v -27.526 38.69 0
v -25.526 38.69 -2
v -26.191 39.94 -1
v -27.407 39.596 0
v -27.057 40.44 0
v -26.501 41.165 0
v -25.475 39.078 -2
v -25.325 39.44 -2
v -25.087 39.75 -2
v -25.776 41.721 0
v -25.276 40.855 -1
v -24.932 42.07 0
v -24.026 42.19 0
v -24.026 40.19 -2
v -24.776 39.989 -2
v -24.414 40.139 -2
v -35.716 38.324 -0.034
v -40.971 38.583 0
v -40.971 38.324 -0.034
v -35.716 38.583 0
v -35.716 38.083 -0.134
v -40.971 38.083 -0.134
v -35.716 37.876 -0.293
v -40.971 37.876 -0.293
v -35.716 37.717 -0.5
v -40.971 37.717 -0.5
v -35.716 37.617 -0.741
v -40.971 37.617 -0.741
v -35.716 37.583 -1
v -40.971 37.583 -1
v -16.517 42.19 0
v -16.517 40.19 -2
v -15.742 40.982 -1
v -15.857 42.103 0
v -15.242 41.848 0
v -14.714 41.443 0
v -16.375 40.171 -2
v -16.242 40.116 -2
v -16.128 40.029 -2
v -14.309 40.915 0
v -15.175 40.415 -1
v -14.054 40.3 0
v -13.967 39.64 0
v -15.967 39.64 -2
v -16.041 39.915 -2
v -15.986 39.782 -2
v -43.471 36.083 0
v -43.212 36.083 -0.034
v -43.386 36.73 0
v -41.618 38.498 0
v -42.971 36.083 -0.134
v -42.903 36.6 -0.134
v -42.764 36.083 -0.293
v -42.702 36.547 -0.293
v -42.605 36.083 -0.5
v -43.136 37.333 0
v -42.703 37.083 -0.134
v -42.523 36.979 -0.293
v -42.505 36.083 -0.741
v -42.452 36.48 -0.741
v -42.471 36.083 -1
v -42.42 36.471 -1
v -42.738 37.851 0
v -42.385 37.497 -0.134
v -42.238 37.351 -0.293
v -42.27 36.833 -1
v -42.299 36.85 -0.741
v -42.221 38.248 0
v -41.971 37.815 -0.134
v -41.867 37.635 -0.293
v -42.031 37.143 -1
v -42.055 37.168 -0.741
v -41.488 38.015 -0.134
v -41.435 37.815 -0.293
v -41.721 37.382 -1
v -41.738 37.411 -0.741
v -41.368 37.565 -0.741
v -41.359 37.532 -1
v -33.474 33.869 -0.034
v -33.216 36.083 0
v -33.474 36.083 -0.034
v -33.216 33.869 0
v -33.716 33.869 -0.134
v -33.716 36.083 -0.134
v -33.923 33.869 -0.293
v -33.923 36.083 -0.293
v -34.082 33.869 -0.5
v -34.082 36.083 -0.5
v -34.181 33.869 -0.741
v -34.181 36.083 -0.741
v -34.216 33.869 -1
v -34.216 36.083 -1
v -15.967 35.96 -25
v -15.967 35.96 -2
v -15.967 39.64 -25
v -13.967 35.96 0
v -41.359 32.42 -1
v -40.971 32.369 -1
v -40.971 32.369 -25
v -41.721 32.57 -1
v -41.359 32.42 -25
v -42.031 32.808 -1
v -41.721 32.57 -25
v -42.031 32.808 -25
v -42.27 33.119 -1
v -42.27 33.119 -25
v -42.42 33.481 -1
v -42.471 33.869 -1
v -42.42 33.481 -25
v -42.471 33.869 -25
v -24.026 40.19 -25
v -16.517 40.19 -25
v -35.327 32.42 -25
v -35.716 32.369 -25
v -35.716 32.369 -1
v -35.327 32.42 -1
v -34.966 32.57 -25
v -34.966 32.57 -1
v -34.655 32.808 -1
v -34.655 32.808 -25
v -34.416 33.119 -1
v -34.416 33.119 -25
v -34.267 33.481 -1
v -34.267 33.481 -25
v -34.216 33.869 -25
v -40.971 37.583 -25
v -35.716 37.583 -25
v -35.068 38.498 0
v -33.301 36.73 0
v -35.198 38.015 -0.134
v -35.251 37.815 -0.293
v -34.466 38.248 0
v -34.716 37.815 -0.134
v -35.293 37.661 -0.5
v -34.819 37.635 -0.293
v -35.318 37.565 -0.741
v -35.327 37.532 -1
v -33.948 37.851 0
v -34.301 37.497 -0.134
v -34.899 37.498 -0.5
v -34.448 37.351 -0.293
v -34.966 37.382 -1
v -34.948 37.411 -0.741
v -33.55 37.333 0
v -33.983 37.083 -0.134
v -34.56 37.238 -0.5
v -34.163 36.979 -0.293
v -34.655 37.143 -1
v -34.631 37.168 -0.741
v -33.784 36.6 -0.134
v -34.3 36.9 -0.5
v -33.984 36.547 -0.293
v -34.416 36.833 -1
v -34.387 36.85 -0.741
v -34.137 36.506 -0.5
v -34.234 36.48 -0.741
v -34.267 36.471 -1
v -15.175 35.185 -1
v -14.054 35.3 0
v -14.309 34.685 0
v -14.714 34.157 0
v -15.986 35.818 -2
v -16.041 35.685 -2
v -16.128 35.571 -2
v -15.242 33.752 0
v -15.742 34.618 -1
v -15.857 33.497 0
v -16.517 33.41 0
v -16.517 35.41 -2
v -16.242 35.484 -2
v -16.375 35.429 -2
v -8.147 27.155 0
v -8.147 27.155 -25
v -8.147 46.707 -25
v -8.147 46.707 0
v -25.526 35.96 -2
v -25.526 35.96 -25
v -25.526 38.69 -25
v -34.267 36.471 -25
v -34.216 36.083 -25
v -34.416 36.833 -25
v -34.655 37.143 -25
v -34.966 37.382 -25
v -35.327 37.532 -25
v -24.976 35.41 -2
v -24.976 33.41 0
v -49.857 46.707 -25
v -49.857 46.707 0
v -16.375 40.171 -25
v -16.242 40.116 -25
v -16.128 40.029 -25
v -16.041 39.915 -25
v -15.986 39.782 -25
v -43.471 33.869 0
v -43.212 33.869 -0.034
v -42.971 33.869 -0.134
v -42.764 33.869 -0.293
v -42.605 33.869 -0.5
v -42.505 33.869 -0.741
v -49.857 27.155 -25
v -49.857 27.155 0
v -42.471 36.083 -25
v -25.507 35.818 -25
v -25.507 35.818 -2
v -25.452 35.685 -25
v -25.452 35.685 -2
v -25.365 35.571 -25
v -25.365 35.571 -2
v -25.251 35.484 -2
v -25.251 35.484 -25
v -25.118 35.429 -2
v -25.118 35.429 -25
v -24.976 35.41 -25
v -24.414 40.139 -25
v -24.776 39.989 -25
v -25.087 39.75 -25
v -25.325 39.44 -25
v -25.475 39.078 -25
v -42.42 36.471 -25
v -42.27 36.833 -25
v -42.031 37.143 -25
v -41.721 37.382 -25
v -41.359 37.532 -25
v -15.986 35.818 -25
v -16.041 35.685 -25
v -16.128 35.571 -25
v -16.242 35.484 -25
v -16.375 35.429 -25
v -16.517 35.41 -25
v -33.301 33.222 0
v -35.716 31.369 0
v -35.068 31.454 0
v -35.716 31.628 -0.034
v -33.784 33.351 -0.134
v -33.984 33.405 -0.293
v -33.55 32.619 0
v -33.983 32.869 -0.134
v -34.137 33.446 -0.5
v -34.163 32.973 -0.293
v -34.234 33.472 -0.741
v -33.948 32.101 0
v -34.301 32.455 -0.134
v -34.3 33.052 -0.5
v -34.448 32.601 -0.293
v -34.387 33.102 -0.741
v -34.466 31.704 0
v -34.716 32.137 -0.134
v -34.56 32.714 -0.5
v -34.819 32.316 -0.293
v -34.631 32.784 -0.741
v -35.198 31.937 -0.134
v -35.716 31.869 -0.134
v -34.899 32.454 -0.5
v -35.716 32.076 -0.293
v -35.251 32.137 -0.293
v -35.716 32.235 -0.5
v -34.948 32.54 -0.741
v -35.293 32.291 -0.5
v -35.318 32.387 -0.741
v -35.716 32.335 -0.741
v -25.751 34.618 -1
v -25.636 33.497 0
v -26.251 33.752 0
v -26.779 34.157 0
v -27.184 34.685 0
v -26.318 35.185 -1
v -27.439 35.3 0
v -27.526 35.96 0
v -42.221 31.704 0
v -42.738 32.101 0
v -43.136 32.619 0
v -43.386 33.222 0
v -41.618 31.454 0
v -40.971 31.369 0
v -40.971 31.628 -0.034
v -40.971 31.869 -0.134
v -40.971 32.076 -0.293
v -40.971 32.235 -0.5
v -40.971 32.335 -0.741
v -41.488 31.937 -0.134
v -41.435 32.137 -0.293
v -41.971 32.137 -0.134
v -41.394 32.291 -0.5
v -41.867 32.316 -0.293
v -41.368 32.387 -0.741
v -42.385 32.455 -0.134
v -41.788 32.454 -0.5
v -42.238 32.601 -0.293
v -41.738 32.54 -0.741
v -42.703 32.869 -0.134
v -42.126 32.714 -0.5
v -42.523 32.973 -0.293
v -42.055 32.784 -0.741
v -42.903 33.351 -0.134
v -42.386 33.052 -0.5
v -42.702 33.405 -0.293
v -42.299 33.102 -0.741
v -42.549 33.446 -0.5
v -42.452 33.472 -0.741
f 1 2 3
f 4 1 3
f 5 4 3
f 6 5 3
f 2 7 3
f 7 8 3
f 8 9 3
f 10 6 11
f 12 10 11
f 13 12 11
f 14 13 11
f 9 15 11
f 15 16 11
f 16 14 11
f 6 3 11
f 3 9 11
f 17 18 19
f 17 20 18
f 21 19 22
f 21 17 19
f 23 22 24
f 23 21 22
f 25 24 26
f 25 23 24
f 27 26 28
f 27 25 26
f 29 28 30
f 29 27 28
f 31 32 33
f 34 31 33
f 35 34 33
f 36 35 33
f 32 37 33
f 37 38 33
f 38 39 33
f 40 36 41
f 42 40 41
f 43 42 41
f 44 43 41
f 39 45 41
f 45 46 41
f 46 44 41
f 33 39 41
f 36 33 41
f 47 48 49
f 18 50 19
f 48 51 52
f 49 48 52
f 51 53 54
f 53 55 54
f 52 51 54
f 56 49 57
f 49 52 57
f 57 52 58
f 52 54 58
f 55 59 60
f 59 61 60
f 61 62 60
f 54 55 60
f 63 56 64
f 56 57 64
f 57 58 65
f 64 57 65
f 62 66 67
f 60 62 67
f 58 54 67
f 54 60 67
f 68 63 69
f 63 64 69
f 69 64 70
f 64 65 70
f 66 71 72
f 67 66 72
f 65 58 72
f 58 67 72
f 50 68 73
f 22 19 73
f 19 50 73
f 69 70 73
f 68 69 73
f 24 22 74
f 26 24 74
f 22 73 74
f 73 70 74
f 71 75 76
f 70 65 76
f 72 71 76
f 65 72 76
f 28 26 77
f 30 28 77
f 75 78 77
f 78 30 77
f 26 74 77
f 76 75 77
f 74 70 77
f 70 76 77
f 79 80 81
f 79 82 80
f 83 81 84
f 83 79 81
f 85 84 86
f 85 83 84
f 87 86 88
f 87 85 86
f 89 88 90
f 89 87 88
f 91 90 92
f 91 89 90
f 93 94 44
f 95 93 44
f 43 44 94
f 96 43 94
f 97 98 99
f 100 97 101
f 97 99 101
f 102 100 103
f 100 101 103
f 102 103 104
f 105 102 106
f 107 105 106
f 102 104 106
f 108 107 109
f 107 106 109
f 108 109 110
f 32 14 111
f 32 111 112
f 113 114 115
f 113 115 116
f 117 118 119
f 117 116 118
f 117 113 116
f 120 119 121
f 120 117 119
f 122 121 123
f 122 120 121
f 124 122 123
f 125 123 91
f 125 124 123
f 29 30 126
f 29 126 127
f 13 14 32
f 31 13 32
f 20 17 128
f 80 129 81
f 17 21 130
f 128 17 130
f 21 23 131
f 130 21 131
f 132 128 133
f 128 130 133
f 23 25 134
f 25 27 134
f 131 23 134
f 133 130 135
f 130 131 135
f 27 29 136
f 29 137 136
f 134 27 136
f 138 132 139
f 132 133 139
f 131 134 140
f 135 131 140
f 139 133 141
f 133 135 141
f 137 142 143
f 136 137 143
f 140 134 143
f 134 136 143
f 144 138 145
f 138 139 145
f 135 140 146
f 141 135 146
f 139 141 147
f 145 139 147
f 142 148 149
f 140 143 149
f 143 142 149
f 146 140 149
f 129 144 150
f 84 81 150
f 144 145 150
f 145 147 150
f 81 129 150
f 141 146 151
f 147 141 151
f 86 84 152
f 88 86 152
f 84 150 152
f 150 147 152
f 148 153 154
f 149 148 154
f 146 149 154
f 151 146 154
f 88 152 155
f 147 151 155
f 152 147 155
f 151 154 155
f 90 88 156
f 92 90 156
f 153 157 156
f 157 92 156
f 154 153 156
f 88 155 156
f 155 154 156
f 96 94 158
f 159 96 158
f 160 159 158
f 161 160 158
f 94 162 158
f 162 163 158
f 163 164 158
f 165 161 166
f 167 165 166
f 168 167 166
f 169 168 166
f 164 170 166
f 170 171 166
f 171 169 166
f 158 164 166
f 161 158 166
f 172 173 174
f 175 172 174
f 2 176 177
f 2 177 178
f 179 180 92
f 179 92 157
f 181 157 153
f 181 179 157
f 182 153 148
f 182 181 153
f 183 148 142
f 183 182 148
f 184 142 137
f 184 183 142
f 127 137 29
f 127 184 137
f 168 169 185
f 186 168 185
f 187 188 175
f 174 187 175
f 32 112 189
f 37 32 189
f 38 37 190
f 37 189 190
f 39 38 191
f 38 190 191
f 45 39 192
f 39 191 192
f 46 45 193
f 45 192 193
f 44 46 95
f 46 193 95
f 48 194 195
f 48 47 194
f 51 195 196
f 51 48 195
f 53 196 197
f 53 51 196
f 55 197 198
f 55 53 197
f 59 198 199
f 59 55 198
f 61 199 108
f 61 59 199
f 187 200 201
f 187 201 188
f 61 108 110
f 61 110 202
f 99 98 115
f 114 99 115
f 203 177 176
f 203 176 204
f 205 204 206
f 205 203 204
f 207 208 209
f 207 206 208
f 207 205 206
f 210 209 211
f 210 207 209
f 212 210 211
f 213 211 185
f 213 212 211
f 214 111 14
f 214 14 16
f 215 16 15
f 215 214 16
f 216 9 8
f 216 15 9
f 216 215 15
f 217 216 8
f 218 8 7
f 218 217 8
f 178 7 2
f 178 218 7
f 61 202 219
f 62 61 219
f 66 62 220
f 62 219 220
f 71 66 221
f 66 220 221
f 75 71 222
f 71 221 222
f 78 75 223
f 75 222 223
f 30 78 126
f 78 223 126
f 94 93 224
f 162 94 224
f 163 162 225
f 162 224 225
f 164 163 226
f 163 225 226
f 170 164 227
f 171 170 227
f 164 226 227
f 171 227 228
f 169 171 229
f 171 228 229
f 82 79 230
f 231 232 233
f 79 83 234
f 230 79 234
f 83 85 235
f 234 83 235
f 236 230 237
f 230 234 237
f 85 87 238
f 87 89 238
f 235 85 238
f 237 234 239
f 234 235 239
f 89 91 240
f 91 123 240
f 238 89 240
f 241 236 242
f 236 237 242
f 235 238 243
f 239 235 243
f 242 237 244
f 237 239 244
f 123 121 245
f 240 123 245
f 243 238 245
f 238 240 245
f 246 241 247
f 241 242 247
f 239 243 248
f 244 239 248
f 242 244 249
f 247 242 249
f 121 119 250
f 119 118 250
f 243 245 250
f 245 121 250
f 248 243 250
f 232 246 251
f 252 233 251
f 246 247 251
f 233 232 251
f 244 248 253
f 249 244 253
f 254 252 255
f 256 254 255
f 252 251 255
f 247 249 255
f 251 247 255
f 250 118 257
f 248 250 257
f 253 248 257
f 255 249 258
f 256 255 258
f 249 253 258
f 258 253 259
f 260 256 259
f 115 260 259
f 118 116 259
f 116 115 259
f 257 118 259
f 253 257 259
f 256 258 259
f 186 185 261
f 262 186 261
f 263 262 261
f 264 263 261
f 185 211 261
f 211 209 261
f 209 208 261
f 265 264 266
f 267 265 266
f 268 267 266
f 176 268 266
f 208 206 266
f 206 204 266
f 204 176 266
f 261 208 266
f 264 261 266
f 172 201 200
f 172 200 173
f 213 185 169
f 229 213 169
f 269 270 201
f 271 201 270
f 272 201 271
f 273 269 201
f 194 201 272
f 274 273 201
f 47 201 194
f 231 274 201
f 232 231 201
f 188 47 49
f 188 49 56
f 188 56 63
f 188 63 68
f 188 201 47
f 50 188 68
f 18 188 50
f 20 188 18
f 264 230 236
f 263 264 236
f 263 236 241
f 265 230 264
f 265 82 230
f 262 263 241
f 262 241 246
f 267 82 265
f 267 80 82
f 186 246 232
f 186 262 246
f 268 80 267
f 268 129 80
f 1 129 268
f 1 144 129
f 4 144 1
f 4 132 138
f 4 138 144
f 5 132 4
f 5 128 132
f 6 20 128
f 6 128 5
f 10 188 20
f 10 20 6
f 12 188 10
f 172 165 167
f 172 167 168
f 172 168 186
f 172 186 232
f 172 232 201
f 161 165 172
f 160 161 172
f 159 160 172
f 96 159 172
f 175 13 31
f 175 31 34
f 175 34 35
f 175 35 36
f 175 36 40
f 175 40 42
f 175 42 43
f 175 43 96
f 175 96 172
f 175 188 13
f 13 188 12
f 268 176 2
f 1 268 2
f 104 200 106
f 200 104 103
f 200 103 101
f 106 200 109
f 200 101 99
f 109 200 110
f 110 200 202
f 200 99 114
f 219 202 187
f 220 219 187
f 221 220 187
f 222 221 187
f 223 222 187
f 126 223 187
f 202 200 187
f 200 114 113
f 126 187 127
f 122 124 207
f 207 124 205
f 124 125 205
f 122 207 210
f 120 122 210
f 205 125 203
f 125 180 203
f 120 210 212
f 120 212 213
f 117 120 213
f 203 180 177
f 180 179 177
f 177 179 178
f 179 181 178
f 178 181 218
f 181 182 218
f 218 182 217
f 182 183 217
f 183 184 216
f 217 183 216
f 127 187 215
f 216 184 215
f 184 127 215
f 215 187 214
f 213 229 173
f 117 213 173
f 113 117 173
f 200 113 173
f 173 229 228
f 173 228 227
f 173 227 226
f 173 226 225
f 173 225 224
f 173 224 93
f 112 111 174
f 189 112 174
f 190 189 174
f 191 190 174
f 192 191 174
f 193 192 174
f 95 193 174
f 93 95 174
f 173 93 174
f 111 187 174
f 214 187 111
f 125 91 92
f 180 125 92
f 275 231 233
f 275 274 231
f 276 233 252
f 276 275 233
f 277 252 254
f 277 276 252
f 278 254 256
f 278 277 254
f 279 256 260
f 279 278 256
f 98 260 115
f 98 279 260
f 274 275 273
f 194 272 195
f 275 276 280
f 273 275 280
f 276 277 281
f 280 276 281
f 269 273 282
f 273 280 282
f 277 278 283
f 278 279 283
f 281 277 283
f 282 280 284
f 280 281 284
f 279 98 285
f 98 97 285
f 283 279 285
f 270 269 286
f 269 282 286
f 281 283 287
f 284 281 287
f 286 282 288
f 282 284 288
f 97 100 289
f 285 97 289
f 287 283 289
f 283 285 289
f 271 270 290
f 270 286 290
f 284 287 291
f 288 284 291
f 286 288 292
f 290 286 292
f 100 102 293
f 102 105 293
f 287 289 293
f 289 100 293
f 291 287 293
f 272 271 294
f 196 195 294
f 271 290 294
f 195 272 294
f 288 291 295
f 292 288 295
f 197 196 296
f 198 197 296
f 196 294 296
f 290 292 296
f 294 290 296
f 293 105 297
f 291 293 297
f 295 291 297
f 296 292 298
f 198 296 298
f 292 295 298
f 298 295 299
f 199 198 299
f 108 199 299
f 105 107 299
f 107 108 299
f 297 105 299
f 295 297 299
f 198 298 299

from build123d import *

# Parameters (mm, degrees)
F0_W     = 41.710345
F0_H     = 19.551726
F0_W_2   = 8.255173
F0_H_2   = 5.21379
F0_W_3   = 9.55862
F0_H_3   = 4.779309
F1_DEPTH = 25
F2_R     = 1.5
F3_R     = 0.55
F4_R     = 1
F5_SIZE  = 2


with BuildPart() as f1:
    # F0 (on Top) → F1 (new body)
    with BuildSketch(Plane.XY):
        with Locations((-29.001724, 36.931037)):
            Rectangle(F0_W, F0_H)
        with Locations((-38.343103, 34.975864)):
            Rectangle(F0_W_2, F0_H_2, mode=Mode.SUBTRACT)
        with Locations((-20.746552, 37.799999)):
            Rectangle(F0_W_3, F0_H_3, mode=Mode.SUBTRACT)
    extrude(amount=-F1_DEPTH)

    # F2
    f2_edges = [f1.edges().sort_by_distance(p)[0] for p in [
        (-42.47069, 37.582759, -12.5),
        (-34.215517, 37.582759, -12.5),
        (-42.47069, 32.368969, -12.5),
        (-34.215517, 32.368969, -12.5),
        (-25.525862, 40.189654, -12.5),
    ]]
    fillet(f2_edges, radius=F2_R)

    # F3
    f3_edges = [f1.edges().sort_by_distance(p)[0] for p in [
        (-15.967242, 40.189654, -12.5),
        (-25.525862, 35.410345, -12.5),
        (-15.967242, 35.410345, -12.5),
    ]]
    fillet(f3_edges, radius=F3_R)

    # F4
    f4_edges = [f1.edges().sort_by_distance(p)[0] for p in [
        (-38.343104, 37.582759, 0),
    ]]
    fillet(f4_edges, radius=F4_R)

    # F5
    f5_edges = [f1.edges().sort_by_distance(p)[0] for p in [
        (-20.271552, 40.189654, 0),
    ]]
    chamfer(f5_edges, length=F5_SIZE)


solid = f1.part
